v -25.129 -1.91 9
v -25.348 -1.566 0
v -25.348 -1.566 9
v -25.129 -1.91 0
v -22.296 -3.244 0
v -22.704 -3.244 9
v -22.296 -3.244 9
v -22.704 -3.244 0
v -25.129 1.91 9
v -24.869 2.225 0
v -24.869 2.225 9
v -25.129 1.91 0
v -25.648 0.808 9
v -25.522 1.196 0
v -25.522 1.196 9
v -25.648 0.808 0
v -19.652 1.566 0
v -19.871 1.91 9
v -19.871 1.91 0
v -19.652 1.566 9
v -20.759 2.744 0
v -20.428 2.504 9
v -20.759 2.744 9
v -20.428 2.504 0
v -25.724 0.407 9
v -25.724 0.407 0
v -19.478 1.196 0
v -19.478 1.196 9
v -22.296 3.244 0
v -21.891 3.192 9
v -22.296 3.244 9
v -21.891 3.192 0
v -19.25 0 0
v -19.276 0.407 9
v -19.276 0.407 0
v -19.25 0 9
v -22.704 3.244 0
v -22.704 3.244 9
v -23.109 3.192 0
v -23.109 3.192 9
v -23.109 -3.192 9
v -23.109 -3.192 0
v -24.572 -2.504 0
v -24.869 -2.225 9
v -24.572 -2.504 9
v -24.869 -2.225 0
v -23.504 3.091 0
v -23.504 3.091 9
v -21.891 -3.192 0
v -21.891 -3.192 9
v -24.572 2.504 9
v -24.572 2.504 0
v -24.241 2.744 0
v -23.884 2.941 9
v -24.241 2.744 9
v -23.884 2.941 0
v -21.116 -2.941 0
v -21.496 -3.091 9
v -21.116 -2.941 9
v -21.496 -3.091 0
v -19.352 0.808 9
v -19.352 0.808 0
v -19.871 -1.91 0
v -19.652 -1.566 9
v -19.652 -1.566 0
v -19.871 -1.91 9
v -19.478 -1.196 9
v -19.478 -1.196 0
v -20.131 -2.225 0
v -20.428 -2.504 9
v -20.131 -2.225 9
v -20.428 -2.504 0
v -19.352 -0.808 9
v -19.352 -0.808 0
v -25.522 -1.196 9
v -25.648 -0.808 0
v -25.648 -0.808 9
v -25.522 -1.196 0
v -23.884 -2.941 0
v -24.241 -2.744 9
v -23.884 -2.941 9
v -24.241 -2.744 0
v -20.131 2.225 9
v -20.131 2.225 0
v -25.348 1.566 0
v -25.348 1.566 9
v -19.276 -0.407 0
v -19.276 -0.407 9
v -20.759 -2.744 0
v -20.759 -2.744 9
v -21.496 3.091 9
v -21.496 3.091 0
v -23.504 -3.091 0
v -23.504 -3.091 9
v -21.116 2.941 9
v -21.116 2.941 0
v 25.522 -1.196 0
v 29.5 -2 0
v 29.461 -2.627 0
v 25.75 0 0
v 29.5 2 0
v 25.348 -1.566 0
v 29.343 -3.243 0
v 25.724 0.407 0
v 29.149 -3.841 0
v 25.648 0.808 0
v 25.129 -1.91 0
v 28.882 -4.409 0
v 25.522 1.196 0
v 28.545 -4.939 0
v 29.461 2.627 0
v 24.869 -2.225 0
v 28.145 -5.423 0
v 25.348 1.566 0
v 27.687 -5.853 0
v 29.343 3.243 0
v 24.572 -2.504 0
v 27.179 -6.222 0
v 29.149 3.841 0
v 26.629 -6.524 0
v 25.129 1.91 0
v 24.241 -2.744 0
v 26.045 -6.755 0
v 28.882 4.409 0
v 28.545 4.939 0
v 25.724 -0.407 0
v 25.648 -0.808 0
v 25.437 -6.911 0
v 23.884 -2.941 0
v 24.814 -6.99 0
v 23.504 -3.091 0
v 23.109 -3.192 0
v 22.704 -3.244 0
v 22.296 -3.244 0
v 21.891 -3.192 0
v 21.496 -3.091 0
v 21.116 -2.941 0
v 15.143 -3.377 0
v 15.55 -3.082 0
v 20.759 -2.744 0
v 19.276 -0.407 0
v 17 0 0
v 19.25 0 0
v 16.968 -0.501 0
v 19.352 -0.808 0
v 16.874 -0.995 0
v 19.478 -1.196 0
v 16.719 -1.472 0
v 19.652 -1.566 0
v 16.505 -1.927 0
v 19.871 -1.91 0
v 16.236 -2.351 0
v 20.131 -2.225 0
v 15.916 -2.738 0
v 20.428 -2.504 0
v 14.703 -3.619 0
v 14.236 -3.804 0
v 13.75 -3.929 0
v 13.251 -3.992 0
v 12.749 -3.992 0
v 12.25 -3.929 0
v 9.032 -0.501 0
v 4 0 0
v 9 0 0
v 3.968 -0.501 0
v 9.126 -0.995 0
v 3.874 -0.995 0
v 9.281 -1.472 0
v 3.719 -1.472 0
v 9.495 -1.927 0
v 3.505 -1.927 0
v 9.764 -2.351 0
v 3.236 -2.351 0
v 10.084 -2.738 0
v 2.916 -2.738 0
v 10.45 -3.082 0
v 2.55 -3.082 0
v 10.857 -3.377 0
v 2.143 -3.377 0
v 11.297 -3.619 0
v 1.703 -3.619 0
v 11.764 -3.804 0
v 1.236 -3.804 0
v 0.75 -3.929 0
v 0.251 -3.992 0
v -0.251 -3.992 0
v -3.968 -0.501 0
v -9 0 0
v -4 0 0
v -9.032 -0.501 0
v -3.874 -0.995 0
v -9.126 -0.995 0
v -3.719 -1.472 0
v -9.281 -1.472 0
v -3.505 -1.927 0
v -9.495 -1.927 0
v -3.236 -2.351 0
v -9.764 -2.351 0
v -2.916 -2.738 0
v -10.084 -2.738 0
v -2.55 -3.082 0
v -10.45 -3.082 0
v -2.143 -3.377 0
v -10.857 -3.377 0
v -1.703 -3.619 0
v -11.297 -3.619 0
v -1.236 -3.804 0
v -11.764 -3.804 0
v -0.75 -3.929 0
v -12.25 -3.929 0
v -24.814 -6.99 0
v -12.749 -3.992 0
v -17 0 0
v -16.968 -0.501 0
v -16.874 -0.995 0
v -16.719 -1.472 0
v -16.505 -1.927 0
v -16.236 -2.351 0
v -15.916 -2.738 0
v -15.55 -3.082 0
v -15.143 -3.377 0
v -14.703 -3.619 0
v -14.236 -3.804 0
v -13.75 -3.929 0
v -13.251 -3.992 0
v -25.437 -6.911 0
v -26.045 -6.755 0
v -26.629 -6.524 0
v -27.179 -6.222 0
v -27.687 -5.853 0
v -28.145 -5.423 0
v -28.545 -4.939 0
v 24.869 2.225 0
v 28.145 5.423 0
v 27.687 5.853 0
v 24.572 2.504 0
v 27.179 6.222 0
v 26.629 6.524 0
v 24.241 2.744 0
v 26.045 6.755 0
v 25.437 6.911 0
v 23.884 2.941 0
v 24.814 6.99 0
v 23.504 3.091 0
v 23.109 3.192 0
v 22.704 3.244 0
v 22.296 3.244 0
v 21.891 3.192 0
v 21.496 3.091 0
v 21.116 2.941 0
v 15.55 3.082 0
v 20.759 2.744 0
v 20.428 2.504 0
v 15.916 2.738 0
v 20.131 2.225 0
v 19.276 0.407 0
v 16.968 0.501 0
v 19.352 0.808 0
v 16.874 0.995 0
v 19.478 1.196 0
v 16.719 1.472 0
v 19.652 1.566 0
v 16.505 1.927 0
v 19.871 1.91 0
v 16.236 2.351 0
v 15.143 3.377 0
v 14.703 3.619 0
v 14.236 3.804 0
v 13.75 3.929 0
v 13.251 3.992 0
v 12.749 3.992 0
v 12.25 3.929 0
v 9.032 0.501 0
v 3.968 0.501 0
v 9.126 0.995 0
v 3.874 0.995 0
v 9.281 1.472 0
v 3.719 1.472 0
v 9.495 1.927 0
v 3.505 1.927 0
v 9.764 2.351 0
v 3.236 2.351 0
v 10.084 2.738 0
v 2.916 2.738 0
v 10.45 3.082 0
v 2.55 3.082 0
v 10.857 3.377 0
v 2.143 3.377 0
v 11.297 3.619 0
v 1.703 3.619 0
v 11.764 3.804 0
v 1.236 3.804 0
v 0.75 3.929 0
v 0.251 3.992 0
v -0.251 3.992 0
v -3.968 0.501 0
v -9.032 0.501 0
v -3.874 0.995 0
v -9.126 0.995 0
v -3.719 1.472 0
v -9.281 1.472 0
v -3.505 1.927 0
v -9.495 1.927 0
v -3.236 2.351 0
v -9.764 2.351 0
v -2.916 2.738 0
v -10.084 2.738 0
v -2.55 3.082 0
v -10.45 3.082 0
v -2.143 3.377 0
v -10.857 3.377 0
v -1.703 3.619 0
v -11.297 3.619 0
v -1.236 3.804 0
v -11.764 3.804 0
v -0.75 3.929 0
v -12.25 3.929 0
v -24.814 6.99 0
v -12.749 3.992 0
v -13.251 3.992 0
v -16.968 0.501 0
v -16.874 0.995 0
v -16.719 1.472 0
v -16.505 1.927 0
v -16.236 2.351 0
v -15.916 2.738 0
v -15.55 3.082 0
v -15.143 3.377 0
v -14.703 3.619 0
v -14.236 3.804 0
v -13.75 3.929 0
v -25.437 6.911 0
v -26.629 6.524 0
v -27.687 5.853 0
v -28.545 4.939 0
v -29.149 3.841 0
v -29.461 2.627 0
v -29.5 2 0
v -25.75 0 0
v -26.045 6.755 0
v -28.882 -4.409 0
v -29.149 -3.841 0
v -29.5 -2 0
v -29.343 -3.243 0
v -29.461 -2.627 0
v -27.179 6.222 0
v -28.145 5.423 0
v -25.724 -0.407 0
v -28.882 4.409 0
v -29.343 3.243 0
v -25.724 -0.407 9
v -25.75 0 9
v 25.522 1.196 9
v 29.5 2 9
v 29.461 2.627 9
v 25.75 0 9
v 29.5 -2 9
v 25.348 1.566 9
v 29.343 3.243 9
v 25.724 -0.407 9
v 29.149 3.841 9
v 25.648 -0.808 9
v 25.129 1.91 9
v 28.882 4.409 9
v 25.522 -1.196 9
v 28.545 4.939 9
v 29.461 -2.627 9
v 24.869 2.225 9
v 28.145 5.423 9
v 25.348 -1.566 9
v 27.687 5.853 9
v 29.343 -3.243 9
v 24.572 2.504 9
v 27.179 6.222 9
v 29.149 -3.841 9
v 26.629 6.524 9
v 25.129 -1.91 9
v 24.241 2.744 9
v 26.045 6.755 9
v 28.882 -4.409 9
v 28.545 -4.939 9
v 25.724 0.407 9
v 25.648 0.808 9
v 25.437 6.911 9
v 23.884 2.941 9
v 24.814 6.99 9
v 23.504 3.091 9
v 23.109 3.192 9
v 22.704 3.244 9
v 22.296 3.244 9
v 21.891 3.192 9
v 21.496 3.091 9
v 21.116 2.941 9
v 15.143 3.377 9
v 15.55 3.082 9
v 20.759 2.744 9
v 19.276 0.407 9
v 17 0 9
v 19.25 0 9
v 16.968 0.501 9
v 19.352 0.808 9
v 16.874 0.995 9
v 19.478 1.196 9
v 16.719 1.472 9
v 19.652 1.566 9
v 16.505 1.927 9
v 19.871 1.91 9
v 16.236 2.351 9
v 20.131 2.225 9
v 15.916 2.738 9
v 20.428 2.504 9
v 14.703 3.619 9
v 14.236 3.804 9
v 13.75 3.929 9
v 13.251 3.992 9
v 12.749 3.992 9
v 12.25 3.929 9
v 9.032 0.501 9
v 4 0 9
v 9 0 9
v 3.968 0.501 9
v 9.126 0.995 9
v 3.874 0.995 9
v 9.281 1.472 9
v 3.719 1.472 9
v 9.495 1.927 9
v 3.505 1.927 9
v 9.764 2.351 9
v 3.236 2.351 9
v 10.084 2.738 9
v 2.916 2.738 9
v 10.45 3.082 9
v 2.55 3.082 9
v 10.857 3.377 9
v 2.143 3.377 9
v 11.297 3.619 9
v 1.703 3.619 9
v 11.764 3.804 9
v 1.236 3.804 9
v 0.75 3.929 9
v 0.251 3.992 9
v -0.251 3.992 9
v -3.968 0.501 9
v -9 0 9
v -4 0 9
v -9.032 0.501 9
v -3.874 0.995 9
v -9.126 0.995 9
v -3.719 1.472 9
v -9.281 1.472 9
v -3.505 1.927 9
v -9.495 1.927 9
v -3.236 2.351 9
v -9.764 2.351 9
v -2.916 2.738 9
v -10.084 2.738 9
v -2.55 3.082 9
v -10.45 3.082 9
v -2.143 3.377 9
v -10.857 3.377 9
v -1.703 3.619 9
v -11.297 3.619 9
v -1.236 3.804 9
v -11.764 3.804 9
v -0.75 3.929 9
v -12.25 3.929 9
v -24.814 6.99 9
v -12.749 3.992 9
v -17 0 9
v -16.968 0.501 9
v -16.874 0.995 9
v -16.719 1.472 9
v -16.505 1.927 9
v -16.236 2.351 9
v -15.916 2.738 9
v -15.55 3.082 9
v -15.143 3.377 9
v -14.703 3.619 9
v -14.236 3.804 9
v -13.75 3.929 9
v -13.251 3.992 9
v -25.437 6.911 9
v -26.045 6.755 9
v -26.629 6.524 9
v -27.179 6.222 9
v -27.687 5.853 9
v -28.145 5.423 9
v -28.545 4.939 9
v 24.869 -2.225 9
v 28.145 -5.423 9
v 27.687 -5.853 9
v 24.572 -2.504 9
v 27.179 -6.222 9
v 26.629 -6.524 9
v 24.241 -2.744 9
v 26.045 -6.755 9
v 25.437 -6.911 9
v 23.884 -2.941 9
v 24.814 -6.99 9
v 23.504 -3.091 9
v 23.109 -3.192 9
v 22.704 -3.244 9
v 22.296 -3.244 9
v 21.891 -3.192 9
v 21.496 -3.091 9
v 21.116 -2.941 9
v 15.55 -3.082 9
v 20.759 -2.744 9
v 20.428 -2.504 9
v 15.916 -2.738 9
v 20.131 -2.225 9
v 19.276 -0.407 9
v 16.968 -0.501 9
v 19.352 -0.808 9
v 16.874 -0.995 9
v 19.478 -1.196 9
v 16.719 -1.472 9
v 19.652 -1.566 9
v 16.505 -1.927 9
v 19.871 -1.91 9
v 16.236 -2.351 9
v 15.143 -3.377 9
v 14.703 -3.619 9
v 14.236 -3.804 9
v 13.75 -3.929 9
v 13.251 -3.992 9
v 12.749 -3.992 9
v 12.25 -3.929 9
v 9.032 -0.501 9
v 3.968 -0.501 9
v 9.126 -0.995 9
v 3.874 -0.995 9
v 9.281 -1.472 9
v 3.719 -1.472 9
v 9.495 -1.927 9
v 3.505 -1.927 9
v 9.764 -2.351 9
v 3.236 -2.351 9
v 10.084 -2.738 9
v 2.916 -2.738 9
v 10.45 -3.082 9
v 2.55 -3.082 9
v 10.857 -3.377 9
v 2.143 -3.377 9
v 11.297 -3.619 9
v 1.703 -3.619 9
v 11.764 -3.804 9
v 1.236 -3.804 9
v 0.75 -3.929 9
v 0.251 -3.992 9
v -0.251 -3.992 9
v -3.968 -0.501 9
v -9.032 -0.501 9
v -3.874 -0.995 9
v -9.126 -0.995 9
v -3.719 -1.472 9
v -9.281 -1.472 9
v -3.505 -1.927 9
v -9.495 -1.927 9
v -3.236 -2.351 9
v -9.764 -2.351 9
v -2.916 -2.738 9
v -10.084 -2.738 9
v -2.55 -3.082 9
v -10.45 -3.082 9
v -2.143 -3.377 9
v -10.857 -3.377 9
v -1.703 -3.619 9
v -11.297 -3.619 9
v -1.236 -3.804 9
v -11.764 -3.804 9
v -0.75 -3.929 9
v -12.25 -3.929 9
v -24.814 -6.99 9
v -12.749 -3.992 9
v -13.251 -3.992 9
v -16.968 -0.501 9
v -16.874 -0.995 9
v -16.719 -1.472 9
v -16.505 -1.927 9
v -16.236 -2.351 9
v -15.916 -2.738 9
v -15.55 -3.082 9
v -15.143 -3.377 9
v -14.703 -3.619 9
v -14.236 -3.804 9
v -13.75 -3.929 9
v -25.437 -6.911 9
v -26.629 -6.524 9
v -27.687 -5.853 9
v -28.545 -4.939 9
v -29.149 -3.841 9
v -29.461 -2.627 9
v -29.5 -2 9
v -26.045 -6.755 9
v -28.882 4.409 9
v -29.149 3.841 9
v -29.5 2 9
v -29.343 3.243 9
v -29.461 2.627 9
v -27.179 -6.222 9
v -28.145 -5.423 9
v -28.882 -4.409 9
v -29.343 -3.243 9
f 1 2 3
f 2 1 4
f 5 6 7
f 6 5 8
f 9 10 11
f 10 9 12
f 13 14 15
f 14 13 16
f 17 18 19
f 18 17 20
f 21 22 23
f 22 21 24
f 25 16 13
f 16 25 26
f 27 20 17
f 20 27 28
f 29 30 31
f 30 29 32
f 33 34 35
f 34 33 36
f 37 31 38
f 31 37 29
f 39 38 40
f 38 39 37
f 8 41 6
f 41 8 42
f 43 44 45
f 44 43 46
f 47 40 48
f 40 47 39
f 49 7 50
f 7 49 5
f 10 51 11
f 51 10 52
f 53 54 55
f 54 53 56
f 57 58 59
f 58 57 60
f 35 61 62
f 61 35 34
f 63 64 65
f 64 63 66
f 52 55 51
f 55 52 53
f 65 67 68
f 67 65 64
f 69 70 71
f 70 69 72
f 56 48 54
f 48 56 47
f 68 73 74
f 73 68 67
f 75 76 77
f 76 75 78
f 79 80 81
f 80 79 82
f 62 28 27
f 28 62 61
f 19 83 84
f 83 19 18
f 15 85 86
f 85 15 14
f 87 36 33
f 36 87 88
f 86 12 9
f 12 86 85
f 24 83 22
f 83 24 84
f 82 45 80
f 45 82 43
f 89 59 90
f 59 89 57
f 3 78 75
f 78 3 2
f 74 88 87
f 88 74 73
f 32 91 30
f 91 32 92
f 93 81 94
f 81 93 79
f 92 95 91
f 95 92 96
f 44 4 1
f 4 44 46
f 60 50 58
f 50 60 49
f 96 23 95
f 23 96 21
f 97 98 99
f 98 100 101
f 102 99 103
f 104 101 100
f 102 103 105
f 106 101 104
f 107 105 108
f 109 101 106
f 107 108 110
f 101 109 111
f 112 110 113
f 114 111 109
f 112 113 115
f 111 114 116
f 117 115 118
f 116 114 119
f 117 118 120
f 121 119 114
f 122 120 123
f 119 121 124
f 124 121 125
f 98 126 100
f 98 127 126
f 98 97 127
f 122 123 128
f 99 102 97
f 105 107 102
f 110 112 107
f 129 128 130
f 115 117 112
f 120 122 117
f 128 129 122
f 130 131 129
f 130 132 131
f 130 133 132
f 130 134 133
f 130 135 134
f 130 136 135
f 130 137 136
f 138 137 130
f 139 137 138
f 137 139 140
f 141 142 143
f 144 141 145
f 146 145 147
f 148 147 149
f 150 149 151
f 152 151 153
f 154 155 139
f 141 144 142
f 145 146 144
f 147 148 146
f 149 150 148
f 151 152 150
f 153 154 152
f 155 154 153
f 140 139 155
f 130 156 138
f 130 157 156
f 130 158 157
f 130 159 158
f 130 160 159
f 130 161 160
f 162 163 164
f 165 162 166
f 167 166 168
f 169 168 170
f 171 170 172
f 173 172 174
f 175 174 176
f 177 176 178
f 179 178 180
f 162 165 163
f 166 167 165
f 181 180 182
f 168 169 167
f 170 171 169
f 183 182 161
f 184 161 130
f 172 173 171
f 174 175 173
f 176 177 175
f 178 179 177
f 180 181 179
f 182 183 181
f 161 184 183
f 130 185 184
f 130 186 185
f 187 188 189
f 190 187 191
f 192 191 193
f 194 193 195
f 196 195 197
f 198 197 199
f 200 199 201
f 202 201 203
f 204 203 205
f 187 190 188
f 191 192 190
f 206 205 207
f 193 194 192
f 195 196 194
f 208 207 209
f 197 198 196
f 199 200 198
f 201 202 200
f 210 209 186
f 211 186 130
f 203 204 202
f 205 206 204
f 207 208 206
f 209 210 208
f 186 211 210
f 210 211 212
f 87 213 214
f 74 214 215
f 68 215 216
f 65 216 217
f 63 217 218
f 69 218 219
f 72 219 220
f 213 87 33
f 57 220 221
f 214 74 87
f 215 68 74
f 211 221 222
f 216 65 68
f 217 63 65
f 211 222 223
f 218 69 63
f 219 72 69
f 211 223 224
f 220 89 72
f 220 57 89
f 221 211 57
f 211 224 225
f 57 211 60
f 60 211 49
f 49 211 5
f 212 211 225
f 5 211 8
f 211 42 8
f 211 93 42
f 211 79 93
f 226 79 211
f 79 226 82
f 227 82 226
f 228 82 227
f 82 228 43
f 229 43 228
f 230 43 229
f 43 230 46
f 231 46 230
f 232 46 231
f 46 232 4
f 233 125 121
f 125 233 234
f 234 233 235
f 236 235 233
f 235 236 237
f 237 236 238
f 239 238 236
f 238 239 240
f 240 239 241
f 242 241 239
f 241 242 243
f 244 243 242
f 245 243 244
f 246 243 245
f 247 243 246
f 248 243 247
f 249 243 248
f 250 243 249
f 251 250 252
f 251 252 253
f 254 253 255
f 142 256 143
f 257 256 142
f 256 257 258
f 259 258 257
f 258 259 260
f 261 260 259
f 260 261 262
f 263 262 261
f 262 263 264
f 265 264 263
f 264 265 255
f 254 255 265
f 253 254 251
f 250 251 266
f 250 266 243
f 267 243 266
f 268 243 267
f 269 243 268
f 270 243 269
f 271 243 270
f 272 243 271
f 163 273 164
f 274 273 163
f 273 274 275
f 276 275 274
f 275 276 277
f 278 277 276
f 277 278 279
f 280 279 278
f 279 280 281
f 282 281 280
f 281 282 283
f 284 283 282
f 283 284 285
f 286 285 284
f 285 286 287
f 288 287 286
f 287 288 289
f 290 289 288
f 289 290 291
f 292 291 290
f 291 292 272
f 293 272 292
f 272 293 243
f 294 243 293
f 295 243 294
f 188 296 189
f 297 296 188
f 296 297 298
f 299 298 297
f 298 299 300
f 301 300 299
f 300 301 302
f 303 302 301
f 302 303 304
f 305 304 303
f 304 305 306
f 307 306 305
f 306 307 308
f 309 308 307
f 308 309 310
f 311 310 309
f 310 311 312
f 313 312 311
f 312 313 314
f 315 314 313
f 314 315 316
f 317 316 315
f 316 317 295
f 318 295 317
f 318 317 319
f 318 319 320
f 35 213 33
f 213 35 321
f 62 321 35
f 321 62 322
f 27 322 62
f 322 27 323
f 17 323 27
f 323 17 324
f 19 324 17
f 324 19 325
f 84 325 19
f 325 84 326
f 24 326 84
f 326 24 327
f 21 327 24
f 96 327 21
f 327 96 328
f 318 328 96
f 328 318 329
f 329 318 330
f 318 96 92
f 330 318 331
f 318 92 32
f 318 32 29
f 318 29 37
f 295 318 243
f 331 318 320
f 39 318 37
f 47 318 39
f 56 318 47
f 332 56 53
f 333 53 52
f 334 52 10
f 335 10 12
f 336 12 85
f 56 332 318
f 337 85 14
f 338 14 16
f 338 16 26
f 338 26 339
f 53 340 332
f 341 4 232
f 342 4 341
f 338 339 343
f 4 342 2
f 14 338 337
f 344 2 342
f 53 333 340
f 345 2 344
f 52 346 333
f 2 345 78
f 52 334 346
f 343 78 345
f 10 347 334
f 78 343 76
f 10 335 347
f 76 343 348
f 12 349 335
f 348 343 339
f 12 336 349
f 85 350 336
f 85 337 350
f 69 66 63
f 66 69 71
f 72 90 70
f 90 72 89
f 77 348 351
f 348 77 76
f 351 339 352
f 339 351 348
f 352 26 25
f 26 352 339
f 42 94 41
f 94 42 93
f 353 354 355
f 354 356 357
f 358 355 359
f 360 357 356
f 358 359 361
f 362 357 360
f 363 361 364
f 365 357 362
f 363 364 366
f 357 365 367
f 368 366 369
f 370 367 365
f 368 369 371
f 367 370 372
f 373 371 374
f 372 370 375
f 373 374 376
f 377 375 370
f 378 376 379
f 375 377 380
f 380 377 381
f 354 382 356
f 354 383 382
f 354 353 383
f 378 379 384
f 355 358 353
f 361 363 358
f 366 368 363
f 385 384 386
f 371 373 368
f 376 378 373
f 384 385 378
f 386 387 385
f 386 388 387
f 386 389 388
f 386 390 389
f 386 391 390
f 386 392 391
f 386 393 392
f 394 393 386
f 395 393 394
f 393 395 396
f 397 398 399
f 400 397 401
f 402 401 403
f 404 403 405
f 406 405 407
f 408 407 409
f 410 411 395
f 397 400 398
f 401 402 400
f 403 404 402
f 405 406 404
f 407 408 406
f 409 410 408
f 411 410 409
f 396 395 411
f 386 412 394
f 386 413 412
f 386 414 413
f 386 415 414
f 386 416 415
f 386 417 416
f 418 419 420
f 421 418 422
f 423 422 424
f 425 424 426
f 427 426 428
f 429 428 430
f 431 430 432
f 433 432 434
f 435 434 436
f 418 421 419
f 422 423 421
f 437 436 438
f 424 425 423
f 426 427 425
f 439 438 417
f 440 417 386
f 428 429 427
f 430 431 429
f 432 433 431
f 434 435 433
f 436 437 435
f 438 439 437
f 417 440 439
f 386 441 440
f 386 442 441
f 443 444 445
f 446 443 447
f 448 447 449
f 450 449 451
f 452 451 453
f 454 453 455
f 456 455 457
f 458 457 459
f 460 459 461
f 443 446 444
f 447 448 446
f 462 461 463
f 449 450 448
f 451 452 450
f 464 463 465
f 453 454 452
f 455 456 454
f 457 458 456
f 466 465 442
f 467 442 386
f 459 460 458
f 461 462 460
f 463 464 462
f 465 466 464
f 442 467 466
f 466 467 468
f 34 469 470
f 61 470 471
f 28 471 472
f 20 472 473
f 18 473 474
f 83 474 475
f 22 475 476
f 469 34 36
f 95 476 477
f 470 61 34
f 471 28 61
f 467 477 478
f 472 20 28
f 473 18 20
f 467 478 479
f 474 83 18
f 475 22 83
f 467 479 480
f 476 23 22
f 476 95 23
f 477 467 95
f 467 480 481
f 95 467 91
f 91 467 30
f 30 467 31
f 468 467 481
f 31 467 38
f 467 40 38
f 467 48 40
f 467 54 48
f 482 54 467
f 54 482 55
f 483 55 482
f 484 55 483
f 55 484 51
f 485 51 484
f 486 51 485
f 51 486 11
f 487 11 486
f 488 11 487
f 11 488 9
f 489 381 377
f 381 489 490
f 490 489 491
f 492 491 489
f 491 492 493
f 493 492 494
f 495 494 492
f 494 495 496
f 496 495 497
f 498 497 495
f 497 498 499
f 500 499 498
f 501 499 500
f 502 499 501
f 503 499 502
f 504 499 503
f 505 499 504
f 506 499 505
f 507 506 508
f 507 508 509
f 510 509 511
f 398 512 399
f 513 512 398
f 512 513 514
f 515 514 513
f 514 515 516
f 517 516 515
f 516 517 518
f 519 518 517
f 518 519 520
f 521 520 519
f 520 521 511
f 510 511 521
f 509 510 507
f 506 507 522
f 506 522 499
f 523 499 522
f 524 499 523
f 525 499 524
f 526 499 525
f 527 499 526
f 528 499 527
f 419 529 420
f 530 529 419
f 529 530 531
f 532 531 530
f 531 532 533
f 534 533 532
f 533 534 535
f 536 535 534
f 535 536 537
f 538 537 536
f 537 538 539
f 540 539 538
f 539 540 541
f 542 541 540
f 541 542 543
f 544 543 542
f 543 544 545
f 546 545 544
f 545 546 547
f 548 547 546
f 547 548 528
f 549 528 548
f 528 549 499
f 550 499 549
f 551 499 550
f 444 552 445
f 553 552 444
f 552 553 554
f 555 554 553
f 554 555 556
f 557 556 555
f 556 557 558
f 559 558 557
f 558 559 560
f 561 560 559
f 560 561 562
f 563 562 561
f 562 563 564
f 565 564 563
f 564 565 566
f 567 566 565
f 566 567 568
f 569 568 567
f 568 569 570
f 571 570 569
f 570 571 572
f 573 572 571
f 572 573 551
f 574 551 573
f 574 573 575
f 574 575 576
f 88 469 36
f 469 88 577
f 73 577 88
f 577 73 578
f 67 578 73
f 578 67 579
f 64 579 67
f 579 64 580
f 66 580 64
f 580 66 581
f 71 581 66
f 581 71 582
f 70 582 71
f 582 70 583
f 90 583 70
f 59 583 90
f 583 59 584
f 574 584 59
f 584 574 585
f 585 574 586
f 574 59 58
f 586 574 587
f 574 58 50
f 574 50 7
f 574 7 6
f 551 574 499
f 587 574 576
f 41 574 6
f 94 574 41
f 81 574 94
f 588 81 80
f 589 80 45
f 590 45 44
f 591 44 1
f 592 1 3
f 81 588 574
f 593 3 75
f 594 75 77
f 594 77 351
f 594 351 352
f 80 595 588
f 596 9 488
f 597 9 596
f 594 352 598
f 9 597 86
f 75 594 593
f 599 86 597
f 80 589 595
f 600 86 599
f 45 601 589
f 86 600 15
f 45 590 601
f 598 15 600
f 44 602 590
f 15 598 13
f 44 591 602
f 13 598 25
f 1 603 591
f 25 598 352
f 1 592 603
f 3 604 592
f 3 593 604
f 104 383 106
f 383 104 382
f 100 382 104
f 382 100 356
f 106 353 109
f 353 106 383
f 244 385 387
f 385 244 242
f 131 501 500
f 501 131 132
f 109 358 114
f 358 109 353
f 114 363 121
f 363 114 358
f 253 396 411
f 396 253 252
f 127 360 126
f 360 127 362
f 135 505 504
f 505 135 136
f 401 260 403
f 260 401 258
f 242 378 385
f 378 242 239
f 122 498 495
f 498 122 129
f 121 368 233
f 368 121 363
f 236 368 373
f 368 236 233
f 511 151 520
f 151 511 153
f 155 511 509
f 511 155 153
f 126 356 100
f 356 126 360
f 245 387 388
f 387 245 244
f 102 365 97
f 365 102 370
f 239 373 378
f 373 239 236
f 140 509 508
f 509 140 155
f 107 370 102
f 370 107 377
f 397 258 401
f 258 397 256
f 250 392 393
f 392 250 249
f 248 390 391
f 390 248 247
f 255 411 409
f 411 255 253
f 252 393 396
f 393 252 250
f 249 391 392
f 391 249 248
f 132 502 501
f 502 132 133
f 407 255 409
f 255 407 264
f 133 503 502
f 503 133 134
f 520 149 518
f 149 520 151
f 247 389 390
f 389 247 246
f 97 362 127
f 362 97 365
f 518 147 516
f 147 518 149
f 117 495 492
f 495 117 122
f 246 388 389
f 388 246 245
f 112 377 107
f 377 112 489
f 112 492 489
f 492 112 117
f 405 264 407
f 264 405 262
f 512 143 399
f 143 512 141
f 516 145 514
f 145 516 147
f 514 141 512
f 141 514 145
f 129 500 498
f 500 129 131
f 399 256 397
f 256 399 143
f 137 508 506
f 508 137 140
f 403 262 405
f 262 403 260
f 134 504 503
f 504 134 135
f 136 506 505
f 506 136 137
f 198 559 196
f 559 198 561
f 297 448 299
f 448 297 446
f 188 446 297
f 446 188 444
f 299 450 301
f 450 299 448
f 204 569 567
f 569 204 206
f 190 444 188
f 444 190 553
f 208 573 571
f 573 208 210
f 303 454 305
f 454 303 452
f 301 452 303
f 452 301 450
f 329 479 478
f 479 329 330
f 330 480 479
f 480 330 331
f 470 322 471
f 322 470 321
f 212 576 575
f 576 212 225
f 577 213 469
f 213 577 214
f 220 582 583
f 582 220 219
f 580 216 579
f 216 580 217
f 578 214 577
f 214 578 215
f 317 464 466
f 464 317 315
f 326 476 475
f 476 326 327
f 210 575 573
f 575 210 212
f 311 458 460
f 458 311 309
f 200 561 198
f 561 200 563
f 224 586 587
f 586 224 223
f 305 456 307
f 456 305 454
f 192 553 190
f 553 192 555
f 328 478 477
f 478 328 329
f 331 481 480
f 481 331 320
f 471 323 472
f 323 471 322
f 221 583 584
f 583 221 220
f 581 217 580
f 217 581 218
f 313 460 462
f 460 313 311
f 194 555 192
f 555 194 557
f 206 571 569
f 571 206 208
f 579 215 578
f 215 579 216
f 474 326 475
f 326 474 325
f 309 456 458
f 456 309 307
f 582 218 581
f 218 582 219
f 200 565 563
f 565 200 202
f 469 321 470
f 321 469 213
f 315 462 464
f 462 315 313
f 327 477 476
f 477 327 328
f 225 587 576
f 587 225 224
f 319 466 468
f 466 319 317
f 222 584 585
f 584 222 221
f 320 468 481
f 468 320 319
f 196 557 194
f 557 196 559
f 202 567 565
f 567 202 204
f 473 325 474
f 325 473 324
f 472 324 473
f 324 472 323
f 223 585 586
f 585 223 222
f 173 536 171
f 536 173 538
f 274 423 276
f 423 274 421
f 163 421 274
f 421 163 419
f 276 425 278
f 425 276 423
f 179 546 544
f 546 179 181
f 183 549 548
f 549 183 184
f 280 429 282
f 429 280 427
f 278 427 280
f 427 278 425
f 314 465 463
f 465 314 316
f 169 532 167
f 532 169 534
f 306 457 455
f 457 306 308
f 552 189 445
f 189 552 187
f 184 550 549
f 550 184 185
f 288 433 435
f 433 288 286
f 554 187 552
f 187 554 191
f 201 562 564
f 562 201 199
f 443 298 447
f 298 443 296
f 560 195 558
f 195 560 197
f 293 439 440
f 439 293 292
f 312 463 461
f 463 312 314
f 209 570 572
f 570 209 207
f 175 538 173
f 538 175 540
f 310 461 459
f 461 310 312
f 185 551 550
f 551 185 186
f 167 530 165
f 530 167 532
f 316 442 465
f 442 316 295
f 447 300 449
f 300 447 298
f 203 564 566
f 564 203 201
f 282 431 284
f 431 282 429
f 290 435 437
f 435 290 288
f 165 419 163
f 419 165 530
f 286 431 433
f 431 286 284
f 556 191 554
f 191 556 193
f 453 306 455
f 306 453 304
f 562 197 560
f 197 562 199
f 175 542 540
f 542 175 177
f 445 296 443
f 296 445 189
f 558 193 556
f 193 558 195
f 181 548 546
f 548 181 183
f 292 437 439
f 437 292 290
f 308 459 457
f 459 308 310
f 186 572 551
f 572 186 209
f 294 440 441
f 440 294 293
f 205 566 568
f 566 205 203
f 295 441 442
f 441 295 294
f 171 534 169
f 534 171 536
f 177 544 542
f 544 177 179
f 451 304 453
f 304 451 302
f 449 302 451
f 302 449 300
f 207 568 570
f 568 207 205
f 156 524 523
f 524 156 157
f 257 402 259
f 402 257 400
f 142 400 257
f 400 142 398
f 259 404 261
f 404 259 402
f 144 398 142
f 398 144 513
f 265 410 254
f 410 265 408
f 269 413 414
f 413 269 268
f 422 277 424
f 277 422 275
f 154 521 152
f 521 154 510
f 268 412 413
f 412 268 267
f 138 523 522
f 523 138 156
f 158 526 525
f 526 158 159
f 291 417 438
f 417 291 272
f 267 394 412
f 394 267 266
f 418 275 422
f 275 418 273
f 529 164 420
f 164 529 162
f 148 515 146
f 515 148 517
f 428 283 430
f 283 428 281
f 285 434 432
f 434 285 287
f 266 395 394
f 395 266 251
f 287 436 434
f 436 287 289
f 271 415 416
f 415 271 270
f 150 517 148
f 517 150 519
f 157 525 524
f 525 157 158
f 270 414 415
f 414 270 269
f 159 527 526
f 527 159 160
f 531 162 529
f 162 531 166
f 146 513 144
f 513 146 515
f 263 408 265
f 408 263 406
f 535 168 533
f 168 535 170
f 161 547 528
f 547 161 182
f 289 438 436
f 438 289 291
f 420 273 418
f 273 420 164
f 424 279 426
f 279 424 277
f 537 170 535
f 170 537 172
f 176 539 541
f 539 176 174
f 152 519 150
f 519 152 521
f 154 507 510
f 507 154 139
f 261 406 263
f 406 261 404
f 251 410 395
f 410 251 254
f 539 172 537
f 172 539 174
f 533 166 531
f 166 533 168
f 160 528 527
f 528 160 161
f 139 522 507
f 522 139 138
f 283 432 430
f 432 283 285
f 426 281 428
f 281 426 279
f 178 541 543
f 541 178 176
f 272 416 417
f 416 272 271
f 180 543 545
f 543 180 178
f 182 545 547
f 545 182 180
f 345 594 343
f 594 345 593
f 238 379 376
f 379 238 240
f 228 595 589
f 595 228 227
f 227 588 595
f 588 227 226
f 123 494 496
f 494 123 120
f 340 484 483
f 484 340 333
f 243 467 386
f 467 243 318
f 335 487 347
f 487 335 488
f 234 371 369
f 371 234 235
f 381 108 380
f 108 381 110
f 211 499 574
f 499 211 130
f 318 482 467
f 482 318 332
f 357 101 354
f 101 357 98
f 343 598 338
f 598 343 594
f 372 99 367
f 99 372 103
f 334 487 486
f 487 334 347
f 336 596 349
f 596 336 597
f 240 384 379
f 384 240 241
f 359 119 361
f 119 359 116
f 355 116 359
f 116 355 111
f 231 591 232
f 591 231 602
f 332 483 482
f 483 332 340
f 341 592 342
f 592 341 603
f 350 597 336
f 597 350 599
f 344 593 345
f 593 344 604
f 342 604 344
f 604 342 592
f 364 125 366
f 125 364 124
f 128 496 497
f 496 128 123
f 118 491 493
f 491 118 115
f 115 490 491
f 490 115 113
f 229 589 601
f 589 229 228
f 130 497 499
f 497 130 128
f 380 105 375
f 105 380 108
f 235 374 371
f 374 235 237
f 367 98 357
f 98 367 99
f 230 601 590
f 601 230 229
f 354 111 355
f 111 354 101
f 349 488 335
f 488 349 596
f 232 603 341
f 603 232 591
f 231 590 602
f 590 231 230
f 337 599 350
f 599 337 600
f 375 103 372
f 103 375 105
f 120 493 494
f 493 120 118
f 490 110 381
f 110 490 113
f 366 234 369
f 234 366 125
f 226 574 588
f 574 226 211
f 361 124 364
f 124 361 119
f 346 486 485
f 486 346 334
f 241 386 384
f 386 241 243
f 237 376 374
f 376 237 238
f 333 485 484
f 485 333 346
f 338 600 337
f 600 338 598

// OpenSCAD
$fn = 50;

difference() {
	union() {
		hull() {
			translate(v = [-24.5, 2.0, 0]) {
				cylinder(h = 9, r = 5);
			}
			translate(v = [24.5, 2.0, 0]) {
				cylinder(h = 9, r = 5);
			}
			translate(v = [-24.5, -2.0, 0]) {
				cylinder(h = 9, r = 5);
			}
			translate(v = [24.5, -2.0, 0]) {
				cylinder(h = 9, r = 5);
			}
		}
	}
	union() {
		translate(v = [-22.5, 0.0, 0]) {
			cylinder(h = 9, r = 3.25);
		}
		translate(v = [22.5, 0.0, 0]) {
			cylinder(h = 9, r = 3.25);
		}
		translate(v = [-13.0, 0, 0.0]) {
			cylinder(h = 9, r = 4.0);
		}
		cylinder(h = 9, r = 4.0);
		translate(v = [13.0, 0, 0.0]) {
			cylinder(h = 9, r = 4.0);
		}
	}
}
